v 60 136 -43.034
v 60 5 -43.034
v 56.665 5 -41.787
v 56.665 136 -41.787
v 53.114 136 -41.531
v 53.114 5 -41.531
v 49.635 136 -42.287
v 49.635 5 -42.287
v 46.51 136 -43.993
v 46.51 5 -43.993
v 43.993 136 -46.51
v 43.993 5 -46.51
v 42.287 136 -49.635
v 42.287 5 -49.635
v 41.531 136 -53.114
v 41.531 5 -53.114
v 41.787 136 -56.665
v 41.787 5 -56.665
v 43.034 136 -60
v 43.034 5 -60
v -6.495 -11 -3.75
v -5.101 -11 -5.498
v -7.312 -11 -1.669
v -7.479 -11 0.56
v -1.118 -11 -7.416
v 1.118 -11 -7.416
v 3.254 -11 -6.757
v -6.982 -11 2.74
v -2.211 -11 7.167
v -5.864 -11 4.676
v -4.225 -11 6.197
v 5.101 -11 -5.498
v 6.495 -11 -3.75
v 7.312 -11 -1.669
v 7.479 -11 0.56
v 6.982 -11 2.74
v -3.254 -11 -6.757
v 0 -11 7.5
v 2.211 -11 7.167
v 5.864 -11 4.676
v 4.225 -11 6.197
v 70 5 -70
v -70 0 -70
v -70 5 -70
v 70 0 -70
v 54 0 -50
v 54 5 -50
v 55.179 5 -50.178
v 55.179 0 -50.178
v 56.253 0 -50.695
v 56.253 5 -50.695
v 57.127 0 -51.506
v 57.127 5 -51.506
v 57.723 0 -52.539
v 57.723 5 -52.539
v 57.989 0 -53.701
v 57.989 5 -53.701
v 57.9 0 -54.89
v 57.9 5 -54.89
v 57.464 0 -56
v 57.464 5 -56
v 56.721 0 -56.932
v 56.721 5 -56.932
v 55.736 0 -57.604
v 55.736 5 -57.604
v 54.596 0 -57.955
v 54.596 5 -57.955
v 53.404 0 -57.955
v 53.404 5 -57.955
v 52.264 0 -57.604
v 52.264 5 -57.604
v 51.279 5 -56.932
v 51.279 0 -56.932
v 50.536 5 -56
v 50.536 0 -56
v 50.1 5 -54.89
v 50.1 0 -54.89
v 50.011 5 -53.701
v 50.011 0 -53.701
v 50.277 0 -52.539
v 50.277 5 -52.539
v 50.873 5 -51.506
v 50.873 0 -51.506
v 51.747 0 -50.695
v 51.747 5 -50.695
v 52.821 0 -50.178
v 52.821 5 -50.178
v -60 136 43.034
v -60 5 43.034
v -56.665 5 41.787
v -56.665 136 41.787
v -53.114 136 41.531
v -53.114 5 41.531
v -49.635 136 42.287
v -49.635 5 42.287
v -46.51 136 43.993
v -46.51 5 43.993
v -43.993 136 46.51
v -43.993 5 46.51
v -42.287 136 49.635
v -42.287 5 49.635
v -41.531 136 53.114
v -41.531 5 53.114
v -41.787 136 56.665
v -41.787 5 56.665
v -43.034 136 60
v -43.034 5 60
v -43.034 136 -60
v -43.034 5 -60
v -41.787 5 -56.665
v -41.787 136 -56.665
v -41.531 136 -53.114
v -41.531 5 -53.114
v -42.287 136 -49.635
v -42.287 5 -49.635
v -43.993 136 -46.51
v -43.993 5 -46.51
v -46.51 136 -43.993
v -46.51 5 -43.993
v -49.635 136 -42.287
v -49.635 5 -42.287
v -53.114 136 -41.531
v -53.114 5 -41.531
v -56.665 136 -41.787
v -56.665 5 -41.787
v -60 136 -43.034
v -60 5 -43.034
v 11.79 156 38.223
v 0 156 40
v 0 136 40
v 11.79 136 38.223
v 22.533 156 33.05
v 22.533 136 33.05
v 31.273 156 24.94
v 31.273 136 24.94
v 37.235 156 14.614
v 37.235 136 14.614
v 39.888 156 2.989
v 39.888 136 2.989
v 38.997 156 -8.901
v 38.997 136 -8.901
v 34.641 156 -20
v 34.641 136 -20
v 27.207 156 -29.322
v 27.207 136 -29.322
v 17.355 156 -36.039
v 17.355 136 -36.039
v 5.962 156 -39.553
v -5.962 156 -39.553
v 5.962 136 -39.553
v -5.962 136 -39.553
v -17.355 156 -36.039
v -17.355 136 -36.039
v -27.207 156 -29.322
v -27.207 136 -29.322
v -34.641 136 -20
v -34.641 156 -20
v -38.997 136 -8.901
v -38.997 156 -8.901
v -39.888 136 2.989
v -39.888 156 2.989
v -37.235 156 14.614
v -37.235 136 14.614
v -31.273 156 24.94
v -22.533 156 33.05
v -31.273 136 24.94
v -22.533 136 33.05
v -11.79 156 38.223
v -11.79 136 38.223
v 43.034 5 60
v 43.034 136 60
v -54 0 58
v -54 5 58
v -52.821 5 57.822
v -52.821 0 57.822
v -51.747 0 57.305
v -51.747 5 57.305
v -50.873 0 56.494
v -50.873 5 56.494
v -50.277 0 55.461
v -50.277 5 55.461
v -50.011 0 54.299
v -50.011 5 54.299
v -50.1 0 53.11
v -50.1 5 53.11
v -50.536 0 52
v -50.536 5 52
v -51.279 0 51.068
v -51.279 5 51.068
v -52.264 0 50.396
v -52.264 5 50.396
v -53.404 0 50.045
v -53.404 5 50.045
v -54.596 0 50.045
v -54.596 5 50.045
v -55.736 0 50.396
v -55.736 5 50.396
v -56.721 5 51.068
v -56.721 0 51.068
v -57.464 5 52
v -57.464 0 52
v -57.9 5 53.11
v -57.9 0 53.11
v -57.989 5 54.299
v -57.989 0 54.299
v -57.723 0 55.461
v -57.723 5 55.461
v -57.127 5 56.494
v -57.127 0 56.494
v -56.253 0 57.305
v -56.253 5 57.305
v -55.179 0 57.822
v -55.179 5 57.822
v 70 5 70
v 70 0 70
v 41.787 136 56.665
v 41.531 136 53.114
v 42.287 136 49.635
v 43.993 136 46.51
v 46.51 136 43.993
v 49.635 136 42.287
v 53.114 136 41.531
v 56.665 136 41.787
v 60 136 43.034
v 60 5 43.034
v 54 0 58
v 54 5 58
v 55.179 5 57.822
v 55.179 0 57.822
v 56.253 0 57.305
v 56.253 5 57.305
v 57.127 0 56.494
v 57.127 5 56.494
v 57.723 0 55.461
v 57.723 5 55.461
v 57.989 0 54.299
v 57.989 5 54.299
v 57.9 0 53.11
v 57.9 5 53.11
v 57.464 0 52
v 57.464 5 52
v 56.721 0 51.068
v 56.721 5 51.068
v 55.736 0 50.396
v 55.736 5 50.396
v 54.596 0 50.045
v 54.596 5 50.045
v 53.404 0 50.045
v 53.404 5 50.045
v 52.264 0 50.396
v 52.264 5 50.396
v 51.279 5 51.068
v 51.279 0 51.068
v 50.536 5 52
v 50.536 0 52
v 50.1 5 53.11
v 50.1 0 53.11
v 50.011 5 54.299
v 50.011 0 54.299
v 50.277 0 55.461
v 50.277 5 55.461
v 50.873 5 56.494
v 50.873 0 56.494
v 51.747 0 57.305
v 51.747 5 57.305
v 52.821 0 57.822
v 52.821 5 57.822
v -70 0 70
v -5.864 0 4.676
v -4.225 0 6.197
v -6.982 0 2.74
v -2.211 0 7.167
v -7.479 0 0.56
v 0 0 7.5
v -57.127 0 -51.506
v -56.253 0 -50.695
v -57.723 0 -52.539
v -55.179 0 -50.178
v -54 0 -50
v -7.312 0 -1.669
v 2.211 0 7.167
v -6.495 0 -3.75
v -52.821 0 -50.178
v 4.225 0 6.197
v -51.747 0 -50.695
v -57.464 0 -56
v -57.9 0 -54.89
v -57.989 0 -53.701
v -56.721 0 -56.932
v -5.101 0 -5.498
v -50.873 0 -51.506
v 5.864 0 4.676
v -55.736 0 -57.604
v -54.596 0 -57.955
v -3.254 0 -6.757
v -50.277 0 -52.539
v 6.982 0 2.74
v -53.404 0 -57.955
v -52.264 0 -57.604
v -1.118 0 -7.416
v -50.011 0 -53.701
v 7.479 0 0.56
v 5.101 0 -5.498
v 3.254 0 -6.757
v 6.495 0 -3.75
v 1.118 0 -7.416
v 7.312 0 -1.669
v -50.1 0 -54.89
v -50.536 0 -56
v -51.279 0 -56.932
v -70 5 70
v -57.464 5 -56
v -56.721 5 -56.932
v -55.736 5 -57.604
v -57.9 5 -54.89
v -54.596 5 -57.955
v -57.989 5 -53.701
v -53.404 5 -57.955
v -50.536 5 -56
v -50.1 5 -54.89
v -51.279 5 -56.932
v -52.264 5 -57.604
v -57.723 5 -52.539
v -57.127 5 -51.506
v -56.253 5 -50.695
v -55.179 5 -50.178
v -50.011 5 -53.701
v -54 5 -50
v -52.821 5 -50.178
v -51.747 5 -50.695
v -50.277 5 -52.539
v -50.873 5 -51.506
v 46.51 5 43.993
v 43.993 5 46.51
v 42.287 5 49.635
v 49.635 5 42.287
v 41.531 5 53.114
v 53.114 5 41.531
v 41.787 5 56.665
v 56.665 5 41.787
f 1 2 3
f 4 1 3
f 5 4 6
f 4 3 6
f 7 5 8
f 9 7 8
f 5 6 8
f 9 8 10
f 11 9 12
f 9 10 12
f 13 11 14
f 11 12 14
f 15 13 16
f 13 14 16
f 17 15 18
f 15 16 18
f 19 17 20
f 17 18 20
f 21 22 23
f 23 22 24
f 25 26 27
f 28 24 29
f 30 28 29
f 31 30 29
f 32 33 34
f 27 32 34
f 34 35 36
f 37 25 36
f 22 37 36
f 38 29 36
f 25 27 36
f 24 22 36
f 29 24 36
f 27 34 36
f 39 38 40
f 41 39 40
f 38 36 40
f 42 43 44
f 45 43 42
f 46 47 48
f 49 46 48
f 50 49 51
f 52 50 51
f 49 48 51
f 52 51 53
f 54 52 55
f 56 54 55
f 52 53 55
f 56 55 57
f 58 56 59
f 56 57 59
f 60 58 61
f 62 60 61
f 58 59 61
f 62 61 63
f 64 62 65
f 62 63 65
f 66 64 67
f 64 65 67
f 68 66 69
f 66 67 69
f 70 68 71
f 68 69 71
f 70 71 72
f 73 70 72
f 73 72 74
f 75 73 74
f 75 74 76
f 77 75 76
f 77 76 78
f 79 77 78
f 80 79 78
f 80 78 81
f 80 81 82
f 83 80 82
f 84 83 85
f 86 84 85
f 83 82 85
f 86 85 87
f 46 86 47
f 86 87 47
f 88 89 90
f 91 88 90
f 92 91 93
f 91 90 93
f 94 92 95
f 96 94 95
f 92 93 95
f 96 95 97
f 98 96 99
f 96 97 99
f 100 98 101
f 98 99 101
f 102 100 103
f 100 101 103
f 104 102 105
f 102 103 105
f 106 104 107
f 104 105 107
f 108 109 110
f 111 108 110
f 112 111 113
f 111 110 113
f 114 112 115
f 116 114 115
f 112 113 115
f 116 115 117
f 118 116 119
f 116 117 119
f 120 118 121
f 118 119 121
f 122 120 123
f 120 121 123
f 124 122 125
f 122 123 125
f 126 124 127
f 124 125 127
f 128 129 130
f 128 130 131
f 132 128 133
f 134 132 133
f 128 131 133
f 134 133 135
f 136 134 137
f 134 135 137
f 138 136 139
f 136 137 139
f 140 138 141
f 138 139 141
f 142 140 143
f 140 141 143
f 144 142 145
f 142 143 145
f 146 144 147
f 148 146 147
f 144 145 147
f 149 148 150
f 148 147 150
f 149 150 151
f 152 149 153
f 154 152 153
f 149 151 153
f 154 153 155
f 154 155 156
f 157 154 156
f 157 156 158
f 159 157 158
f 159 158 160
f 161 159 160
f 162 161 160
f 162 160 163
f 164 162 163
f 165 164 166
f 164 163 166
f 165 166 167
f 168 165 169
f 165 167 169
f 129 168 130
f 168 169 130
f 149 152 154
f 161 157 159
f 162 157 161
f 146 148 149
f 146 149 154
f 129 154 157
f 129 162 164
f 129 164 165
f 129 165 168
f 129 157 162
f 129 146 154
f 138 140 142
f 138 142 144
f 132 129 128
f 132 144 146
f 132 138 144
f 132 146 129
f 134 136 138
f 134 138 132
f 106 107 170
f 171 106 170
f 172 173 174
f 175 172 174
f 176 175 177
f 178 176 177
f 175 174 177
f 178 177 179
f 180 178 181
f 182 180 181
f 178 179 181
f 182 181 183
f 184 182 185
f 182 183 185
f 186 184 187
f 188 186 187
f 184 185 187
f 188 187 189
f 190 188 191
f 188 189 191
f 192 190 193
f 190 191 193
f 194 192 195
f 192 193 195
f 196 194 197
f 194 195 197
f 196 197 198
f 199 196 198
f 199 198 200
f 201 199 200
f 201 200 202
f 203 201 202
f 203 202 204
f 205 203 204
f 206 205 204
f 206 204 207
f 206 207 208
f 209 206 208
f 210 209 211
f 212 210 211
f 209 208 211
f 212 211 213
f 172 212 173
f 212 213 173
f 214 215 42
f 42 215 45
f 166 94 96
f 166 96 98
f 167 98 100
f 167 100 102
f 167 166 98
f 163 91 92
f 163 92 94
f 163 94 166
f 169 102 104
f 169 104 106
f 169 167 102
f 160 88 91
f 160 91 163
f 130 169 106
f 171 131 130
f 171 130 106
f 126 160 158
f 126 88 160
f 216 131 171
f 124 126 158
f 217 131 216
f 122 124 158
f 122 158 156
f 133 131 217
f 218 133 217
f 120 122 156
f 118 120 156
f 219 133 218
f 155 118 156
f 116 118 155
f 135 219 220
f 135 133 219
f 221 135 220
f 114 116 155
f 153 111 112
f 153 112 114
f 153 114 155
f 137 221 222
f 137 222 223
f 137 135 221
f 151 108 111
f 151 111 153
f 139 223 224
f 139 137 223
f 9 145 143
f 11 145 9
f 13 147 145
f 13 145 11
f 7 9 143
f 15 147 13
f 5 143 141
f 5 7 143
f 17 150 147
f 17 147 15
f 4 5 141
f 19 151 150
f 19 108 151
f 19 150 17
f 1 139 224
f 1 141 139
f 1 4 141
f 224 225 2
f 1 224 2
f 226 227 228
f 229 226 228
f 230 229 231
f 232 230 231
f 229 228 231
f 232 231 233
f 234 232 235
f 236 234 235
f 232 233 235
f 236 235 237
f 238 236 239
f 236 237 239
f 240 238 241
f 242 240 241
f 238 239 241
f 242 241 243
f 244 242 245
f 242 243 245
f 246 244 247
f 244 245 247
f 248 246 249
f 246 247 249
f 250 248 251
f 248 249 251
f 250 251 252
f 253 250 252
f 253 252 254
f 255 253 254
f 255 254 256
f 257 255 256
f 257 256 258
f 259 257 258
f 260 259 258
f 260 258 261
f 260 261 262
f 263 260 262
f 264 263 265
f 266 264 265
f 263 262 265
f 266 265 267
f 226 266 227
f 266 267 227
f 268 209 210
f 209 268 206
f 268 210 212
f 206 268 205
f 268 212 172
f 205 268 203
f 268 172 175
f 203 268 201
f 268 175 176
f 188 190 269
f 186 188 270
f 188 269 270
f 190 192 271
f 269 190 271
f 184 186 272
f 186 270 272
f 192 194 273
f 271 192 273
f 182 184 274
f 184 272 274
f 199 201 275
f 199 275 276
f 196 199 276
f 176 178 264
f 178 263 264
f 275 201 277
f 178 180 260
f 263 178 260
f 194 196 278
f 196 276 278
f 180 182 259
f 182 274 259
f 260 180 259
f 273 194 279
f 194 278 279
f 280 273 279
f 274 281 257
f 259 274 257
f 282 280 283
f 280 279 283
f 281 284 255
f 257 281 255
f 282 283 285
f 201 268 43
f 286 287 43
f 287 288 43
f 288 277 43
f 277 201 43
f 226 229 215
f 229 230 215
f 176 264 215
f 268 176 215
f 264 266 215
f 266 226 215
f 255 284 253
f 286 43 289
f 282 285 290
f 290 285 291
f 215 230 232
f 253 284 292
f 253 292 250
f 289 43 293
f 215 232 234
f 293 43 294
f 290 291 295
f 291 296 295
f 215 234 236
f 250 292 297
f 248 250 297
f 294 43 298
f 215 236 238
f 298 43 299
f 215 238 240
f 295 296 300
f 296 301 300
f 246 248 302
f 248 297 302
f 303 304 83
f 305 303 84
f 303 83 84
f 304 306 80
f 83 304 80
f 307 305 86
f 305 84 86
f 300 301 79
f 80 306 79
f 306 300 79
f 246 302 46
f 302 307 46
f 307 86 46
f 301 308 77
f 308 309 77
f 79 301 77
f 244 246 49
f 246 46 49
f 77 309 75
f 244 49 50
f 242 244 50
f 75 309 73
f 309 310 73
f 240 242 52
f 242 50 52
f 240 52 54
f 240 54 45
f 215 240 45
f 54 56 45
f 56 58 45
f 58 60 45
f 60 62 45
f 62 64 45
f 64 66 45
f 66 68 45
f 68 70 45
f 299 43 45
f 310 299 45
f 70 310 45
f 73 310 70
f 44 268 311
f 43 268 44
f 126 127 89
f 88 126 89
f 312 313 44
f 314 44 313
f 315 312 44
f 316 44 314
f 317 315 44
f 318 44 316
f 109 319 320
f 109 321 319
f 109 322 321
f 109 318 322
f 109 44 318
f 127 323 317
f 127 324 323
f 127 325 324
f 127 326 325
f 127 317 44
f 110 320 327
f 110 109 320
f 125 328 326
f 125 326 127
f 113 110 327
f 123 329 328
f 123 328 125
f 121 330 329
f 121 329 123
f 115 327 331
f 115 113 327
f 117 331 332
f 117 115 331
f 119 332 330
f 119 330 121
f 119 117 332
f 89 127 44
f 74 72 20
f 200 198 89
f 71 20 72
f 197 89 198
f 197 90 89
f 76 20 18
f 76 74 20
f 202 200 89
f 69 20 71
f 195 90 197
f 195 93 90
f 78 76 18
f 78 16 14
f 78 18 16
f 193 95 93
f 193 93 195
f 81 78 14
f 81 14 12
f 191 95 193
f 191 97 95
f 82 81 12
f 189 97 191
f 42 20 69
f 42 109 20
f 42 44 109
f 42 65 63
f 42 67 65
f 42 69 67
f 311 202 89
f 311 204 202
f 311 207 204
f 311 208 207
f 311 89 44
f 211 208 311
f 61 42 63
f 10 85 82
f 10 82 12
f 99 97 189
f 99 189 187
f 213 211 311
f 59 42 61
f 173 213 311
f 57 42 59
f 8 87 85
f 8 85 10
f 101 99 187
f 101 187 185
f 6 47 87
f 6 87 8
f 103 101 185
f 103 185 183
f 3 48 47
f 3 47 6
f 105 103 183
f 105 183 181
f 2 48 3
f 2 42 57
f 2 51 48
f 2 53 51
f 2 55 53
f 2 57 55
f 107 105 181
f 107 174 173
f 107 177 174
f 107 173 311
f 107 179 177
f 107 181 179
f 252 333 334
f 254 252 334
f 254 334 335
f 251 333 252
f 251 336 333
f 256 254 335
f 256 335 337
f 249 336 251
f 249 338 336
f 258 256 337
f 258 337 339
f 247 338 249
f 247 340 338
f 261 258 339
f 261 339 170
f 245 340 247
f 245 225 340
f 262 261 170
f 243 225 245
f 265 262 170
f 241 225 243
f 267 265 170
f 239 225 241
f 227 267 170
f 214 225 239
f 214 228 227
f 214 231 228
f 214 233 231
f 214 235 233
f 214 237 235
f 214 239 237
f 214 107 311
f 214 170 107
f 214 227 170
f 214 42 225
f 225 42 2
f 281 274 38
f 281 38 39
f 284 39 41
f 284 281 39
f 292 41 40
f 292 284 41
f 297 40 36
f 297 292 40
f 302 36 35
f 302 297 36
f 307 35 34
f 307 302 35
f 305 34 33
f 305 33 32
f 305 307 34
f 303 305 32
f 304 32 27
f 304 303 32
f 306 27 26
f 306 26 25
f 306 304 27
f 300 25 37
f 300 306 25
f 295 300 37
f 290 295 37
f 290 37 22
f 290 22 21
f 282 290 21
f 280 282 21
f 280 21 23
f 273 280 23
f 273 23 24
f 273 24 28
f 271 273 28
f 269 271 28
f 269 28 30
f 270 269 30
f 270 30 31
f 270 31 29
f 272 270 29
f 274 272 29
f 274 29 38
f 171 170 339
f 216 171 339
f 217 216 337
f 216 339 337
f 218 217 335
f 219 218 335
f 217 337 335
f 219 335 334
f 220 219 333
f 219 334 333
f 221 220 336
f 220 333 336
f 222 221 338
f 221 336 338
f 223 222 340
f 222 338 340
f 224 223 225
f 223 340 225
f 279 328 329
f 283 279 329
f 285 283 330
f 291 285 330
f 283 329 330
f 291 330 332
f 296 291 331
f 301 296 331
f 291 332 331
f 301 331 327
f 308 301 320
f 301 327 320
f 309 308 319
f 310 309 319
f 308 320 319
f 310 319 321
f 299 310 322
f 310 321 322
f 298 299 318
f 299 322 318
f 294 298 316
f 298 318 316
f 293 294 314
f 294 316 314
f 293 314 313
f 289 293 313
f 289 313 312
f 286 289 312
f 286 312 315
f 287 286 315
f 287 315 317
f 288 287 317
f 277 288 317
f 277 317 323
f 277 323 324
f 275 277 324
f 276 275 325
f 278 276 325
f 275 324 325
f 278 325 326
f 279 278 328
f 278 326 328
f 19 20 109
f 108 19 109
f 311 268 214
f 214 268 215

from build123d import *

# Parameters (mm, degrees)
SKETCH_1_W          = 140
SKETCH_1_H          = 140
EXTRUDE_1_DEPTH     = 5
SKETCH_2_R          = 4
CUT_EXTRUDE_1_DEPTH = 5
SKETCH_3_R          = 7.5
EXTRUDE_2_DEPTH     = 16
EXTRUDE_3_DEPTH     = 131
SKETCH_5_R          = 40
EXTRUDE_4_DEPTH     = 20


with BuildPart() as part:
    # 草图1 → 凸台-拉伸1 (new body)
    with BuildSketch(Plane(origin=(0, 0, 0), x_dir=(1, 0, 0), z_dir=(0, 1, 0))):
        Rectangle(SKETCH_1_W, SKETCH_1_H)
    extrude(amount=EXTRUDE_1_DEPTH)

    # 草图2 → 切除-拉伸1 (cut)
    with BuildSketch(Plane(origin=(0, 5, 0), x_dir=(1, 0, 0), z_dir=(0, 1, 0))):
        with Locations(Location((-54, 54, 0), (0, 0, 270))):
            Circle(SKETCH_2_R)
        with Locations(Location((54, 54, 0), (0, 0, 270))):
            Circle(SKETCH_2_R)
        with Locations(Location((54, -54, 0), (0, 0, 270))):
            Circle(SKETCH_2_R)
        with Locations(Location((-54, -54, 0), (0, 0, 270))):
            Circle(SKETCH_2_R)
    extrude(amount=-CUT_EXTRUDE_1_DEPTH, mode=Mode.SUBTRACT)

    # 草图3 → 凸台-拉伸2 (add)
    with BuildSketch(Plane(origin=(0, 5, 0), x_dir=(1, 0, 0), z_dir=(0, 1, 0))):
        with Locations(Location((0, 0, 0), (0, 0, 270))):
            Circle(SKETCH_3_R)
    extrude(amount=-EXTRUDE_2_DEPTH)

    # 草图4 → 凸台-拉伸3 (add)
    with BuildSketch(Plane(origin=(0, 5, 0), x_dir=(1, 0, 0), z_dir=(0, 1, 0))):
        with BuildLine():
            Line((-43.0341439, -60), (43.0341439, -60))
            ThreePointArc((43.0341439, -60), (45.161165235, -45.161165235), (60, -43.0341439))
            Line((60, -43.0341439), (60, 43.0341439))
            ThreePointArc((60, 43.0341439), (45.161165235, 45.161165235), (43.0341439, 60))
            Line((43.0341439, 60), (-43.0341439, 60))
            ThreePointArc((-43.0341439, 60), (-45.161165235, 45.161165235), (-60, 43.0341439))
            Line((-60, 43.0341439), (-60, -43.0341439))
            ThreePointArc((-60, -43.0341439), (-45.161165235, -45.161165235), (-43.0341439, -60))
        make_face()
    extrude(amount=EXTRUDE_3_DEPTH)

    # 草图5 → 凸台-拉伸4 (add)
    with BuildSketch(Plane(origin=(0, 136, 0), x_dir=(1, 0, 0), z_dir=(0, 1, 0))):
        with Locations(Location((0, 0, 0), (0, 0, 270))):
            Circle(SKETCH_5_R)
    extrude(amount=EXTRUDE_4_DEPTH)


solid = part.part
